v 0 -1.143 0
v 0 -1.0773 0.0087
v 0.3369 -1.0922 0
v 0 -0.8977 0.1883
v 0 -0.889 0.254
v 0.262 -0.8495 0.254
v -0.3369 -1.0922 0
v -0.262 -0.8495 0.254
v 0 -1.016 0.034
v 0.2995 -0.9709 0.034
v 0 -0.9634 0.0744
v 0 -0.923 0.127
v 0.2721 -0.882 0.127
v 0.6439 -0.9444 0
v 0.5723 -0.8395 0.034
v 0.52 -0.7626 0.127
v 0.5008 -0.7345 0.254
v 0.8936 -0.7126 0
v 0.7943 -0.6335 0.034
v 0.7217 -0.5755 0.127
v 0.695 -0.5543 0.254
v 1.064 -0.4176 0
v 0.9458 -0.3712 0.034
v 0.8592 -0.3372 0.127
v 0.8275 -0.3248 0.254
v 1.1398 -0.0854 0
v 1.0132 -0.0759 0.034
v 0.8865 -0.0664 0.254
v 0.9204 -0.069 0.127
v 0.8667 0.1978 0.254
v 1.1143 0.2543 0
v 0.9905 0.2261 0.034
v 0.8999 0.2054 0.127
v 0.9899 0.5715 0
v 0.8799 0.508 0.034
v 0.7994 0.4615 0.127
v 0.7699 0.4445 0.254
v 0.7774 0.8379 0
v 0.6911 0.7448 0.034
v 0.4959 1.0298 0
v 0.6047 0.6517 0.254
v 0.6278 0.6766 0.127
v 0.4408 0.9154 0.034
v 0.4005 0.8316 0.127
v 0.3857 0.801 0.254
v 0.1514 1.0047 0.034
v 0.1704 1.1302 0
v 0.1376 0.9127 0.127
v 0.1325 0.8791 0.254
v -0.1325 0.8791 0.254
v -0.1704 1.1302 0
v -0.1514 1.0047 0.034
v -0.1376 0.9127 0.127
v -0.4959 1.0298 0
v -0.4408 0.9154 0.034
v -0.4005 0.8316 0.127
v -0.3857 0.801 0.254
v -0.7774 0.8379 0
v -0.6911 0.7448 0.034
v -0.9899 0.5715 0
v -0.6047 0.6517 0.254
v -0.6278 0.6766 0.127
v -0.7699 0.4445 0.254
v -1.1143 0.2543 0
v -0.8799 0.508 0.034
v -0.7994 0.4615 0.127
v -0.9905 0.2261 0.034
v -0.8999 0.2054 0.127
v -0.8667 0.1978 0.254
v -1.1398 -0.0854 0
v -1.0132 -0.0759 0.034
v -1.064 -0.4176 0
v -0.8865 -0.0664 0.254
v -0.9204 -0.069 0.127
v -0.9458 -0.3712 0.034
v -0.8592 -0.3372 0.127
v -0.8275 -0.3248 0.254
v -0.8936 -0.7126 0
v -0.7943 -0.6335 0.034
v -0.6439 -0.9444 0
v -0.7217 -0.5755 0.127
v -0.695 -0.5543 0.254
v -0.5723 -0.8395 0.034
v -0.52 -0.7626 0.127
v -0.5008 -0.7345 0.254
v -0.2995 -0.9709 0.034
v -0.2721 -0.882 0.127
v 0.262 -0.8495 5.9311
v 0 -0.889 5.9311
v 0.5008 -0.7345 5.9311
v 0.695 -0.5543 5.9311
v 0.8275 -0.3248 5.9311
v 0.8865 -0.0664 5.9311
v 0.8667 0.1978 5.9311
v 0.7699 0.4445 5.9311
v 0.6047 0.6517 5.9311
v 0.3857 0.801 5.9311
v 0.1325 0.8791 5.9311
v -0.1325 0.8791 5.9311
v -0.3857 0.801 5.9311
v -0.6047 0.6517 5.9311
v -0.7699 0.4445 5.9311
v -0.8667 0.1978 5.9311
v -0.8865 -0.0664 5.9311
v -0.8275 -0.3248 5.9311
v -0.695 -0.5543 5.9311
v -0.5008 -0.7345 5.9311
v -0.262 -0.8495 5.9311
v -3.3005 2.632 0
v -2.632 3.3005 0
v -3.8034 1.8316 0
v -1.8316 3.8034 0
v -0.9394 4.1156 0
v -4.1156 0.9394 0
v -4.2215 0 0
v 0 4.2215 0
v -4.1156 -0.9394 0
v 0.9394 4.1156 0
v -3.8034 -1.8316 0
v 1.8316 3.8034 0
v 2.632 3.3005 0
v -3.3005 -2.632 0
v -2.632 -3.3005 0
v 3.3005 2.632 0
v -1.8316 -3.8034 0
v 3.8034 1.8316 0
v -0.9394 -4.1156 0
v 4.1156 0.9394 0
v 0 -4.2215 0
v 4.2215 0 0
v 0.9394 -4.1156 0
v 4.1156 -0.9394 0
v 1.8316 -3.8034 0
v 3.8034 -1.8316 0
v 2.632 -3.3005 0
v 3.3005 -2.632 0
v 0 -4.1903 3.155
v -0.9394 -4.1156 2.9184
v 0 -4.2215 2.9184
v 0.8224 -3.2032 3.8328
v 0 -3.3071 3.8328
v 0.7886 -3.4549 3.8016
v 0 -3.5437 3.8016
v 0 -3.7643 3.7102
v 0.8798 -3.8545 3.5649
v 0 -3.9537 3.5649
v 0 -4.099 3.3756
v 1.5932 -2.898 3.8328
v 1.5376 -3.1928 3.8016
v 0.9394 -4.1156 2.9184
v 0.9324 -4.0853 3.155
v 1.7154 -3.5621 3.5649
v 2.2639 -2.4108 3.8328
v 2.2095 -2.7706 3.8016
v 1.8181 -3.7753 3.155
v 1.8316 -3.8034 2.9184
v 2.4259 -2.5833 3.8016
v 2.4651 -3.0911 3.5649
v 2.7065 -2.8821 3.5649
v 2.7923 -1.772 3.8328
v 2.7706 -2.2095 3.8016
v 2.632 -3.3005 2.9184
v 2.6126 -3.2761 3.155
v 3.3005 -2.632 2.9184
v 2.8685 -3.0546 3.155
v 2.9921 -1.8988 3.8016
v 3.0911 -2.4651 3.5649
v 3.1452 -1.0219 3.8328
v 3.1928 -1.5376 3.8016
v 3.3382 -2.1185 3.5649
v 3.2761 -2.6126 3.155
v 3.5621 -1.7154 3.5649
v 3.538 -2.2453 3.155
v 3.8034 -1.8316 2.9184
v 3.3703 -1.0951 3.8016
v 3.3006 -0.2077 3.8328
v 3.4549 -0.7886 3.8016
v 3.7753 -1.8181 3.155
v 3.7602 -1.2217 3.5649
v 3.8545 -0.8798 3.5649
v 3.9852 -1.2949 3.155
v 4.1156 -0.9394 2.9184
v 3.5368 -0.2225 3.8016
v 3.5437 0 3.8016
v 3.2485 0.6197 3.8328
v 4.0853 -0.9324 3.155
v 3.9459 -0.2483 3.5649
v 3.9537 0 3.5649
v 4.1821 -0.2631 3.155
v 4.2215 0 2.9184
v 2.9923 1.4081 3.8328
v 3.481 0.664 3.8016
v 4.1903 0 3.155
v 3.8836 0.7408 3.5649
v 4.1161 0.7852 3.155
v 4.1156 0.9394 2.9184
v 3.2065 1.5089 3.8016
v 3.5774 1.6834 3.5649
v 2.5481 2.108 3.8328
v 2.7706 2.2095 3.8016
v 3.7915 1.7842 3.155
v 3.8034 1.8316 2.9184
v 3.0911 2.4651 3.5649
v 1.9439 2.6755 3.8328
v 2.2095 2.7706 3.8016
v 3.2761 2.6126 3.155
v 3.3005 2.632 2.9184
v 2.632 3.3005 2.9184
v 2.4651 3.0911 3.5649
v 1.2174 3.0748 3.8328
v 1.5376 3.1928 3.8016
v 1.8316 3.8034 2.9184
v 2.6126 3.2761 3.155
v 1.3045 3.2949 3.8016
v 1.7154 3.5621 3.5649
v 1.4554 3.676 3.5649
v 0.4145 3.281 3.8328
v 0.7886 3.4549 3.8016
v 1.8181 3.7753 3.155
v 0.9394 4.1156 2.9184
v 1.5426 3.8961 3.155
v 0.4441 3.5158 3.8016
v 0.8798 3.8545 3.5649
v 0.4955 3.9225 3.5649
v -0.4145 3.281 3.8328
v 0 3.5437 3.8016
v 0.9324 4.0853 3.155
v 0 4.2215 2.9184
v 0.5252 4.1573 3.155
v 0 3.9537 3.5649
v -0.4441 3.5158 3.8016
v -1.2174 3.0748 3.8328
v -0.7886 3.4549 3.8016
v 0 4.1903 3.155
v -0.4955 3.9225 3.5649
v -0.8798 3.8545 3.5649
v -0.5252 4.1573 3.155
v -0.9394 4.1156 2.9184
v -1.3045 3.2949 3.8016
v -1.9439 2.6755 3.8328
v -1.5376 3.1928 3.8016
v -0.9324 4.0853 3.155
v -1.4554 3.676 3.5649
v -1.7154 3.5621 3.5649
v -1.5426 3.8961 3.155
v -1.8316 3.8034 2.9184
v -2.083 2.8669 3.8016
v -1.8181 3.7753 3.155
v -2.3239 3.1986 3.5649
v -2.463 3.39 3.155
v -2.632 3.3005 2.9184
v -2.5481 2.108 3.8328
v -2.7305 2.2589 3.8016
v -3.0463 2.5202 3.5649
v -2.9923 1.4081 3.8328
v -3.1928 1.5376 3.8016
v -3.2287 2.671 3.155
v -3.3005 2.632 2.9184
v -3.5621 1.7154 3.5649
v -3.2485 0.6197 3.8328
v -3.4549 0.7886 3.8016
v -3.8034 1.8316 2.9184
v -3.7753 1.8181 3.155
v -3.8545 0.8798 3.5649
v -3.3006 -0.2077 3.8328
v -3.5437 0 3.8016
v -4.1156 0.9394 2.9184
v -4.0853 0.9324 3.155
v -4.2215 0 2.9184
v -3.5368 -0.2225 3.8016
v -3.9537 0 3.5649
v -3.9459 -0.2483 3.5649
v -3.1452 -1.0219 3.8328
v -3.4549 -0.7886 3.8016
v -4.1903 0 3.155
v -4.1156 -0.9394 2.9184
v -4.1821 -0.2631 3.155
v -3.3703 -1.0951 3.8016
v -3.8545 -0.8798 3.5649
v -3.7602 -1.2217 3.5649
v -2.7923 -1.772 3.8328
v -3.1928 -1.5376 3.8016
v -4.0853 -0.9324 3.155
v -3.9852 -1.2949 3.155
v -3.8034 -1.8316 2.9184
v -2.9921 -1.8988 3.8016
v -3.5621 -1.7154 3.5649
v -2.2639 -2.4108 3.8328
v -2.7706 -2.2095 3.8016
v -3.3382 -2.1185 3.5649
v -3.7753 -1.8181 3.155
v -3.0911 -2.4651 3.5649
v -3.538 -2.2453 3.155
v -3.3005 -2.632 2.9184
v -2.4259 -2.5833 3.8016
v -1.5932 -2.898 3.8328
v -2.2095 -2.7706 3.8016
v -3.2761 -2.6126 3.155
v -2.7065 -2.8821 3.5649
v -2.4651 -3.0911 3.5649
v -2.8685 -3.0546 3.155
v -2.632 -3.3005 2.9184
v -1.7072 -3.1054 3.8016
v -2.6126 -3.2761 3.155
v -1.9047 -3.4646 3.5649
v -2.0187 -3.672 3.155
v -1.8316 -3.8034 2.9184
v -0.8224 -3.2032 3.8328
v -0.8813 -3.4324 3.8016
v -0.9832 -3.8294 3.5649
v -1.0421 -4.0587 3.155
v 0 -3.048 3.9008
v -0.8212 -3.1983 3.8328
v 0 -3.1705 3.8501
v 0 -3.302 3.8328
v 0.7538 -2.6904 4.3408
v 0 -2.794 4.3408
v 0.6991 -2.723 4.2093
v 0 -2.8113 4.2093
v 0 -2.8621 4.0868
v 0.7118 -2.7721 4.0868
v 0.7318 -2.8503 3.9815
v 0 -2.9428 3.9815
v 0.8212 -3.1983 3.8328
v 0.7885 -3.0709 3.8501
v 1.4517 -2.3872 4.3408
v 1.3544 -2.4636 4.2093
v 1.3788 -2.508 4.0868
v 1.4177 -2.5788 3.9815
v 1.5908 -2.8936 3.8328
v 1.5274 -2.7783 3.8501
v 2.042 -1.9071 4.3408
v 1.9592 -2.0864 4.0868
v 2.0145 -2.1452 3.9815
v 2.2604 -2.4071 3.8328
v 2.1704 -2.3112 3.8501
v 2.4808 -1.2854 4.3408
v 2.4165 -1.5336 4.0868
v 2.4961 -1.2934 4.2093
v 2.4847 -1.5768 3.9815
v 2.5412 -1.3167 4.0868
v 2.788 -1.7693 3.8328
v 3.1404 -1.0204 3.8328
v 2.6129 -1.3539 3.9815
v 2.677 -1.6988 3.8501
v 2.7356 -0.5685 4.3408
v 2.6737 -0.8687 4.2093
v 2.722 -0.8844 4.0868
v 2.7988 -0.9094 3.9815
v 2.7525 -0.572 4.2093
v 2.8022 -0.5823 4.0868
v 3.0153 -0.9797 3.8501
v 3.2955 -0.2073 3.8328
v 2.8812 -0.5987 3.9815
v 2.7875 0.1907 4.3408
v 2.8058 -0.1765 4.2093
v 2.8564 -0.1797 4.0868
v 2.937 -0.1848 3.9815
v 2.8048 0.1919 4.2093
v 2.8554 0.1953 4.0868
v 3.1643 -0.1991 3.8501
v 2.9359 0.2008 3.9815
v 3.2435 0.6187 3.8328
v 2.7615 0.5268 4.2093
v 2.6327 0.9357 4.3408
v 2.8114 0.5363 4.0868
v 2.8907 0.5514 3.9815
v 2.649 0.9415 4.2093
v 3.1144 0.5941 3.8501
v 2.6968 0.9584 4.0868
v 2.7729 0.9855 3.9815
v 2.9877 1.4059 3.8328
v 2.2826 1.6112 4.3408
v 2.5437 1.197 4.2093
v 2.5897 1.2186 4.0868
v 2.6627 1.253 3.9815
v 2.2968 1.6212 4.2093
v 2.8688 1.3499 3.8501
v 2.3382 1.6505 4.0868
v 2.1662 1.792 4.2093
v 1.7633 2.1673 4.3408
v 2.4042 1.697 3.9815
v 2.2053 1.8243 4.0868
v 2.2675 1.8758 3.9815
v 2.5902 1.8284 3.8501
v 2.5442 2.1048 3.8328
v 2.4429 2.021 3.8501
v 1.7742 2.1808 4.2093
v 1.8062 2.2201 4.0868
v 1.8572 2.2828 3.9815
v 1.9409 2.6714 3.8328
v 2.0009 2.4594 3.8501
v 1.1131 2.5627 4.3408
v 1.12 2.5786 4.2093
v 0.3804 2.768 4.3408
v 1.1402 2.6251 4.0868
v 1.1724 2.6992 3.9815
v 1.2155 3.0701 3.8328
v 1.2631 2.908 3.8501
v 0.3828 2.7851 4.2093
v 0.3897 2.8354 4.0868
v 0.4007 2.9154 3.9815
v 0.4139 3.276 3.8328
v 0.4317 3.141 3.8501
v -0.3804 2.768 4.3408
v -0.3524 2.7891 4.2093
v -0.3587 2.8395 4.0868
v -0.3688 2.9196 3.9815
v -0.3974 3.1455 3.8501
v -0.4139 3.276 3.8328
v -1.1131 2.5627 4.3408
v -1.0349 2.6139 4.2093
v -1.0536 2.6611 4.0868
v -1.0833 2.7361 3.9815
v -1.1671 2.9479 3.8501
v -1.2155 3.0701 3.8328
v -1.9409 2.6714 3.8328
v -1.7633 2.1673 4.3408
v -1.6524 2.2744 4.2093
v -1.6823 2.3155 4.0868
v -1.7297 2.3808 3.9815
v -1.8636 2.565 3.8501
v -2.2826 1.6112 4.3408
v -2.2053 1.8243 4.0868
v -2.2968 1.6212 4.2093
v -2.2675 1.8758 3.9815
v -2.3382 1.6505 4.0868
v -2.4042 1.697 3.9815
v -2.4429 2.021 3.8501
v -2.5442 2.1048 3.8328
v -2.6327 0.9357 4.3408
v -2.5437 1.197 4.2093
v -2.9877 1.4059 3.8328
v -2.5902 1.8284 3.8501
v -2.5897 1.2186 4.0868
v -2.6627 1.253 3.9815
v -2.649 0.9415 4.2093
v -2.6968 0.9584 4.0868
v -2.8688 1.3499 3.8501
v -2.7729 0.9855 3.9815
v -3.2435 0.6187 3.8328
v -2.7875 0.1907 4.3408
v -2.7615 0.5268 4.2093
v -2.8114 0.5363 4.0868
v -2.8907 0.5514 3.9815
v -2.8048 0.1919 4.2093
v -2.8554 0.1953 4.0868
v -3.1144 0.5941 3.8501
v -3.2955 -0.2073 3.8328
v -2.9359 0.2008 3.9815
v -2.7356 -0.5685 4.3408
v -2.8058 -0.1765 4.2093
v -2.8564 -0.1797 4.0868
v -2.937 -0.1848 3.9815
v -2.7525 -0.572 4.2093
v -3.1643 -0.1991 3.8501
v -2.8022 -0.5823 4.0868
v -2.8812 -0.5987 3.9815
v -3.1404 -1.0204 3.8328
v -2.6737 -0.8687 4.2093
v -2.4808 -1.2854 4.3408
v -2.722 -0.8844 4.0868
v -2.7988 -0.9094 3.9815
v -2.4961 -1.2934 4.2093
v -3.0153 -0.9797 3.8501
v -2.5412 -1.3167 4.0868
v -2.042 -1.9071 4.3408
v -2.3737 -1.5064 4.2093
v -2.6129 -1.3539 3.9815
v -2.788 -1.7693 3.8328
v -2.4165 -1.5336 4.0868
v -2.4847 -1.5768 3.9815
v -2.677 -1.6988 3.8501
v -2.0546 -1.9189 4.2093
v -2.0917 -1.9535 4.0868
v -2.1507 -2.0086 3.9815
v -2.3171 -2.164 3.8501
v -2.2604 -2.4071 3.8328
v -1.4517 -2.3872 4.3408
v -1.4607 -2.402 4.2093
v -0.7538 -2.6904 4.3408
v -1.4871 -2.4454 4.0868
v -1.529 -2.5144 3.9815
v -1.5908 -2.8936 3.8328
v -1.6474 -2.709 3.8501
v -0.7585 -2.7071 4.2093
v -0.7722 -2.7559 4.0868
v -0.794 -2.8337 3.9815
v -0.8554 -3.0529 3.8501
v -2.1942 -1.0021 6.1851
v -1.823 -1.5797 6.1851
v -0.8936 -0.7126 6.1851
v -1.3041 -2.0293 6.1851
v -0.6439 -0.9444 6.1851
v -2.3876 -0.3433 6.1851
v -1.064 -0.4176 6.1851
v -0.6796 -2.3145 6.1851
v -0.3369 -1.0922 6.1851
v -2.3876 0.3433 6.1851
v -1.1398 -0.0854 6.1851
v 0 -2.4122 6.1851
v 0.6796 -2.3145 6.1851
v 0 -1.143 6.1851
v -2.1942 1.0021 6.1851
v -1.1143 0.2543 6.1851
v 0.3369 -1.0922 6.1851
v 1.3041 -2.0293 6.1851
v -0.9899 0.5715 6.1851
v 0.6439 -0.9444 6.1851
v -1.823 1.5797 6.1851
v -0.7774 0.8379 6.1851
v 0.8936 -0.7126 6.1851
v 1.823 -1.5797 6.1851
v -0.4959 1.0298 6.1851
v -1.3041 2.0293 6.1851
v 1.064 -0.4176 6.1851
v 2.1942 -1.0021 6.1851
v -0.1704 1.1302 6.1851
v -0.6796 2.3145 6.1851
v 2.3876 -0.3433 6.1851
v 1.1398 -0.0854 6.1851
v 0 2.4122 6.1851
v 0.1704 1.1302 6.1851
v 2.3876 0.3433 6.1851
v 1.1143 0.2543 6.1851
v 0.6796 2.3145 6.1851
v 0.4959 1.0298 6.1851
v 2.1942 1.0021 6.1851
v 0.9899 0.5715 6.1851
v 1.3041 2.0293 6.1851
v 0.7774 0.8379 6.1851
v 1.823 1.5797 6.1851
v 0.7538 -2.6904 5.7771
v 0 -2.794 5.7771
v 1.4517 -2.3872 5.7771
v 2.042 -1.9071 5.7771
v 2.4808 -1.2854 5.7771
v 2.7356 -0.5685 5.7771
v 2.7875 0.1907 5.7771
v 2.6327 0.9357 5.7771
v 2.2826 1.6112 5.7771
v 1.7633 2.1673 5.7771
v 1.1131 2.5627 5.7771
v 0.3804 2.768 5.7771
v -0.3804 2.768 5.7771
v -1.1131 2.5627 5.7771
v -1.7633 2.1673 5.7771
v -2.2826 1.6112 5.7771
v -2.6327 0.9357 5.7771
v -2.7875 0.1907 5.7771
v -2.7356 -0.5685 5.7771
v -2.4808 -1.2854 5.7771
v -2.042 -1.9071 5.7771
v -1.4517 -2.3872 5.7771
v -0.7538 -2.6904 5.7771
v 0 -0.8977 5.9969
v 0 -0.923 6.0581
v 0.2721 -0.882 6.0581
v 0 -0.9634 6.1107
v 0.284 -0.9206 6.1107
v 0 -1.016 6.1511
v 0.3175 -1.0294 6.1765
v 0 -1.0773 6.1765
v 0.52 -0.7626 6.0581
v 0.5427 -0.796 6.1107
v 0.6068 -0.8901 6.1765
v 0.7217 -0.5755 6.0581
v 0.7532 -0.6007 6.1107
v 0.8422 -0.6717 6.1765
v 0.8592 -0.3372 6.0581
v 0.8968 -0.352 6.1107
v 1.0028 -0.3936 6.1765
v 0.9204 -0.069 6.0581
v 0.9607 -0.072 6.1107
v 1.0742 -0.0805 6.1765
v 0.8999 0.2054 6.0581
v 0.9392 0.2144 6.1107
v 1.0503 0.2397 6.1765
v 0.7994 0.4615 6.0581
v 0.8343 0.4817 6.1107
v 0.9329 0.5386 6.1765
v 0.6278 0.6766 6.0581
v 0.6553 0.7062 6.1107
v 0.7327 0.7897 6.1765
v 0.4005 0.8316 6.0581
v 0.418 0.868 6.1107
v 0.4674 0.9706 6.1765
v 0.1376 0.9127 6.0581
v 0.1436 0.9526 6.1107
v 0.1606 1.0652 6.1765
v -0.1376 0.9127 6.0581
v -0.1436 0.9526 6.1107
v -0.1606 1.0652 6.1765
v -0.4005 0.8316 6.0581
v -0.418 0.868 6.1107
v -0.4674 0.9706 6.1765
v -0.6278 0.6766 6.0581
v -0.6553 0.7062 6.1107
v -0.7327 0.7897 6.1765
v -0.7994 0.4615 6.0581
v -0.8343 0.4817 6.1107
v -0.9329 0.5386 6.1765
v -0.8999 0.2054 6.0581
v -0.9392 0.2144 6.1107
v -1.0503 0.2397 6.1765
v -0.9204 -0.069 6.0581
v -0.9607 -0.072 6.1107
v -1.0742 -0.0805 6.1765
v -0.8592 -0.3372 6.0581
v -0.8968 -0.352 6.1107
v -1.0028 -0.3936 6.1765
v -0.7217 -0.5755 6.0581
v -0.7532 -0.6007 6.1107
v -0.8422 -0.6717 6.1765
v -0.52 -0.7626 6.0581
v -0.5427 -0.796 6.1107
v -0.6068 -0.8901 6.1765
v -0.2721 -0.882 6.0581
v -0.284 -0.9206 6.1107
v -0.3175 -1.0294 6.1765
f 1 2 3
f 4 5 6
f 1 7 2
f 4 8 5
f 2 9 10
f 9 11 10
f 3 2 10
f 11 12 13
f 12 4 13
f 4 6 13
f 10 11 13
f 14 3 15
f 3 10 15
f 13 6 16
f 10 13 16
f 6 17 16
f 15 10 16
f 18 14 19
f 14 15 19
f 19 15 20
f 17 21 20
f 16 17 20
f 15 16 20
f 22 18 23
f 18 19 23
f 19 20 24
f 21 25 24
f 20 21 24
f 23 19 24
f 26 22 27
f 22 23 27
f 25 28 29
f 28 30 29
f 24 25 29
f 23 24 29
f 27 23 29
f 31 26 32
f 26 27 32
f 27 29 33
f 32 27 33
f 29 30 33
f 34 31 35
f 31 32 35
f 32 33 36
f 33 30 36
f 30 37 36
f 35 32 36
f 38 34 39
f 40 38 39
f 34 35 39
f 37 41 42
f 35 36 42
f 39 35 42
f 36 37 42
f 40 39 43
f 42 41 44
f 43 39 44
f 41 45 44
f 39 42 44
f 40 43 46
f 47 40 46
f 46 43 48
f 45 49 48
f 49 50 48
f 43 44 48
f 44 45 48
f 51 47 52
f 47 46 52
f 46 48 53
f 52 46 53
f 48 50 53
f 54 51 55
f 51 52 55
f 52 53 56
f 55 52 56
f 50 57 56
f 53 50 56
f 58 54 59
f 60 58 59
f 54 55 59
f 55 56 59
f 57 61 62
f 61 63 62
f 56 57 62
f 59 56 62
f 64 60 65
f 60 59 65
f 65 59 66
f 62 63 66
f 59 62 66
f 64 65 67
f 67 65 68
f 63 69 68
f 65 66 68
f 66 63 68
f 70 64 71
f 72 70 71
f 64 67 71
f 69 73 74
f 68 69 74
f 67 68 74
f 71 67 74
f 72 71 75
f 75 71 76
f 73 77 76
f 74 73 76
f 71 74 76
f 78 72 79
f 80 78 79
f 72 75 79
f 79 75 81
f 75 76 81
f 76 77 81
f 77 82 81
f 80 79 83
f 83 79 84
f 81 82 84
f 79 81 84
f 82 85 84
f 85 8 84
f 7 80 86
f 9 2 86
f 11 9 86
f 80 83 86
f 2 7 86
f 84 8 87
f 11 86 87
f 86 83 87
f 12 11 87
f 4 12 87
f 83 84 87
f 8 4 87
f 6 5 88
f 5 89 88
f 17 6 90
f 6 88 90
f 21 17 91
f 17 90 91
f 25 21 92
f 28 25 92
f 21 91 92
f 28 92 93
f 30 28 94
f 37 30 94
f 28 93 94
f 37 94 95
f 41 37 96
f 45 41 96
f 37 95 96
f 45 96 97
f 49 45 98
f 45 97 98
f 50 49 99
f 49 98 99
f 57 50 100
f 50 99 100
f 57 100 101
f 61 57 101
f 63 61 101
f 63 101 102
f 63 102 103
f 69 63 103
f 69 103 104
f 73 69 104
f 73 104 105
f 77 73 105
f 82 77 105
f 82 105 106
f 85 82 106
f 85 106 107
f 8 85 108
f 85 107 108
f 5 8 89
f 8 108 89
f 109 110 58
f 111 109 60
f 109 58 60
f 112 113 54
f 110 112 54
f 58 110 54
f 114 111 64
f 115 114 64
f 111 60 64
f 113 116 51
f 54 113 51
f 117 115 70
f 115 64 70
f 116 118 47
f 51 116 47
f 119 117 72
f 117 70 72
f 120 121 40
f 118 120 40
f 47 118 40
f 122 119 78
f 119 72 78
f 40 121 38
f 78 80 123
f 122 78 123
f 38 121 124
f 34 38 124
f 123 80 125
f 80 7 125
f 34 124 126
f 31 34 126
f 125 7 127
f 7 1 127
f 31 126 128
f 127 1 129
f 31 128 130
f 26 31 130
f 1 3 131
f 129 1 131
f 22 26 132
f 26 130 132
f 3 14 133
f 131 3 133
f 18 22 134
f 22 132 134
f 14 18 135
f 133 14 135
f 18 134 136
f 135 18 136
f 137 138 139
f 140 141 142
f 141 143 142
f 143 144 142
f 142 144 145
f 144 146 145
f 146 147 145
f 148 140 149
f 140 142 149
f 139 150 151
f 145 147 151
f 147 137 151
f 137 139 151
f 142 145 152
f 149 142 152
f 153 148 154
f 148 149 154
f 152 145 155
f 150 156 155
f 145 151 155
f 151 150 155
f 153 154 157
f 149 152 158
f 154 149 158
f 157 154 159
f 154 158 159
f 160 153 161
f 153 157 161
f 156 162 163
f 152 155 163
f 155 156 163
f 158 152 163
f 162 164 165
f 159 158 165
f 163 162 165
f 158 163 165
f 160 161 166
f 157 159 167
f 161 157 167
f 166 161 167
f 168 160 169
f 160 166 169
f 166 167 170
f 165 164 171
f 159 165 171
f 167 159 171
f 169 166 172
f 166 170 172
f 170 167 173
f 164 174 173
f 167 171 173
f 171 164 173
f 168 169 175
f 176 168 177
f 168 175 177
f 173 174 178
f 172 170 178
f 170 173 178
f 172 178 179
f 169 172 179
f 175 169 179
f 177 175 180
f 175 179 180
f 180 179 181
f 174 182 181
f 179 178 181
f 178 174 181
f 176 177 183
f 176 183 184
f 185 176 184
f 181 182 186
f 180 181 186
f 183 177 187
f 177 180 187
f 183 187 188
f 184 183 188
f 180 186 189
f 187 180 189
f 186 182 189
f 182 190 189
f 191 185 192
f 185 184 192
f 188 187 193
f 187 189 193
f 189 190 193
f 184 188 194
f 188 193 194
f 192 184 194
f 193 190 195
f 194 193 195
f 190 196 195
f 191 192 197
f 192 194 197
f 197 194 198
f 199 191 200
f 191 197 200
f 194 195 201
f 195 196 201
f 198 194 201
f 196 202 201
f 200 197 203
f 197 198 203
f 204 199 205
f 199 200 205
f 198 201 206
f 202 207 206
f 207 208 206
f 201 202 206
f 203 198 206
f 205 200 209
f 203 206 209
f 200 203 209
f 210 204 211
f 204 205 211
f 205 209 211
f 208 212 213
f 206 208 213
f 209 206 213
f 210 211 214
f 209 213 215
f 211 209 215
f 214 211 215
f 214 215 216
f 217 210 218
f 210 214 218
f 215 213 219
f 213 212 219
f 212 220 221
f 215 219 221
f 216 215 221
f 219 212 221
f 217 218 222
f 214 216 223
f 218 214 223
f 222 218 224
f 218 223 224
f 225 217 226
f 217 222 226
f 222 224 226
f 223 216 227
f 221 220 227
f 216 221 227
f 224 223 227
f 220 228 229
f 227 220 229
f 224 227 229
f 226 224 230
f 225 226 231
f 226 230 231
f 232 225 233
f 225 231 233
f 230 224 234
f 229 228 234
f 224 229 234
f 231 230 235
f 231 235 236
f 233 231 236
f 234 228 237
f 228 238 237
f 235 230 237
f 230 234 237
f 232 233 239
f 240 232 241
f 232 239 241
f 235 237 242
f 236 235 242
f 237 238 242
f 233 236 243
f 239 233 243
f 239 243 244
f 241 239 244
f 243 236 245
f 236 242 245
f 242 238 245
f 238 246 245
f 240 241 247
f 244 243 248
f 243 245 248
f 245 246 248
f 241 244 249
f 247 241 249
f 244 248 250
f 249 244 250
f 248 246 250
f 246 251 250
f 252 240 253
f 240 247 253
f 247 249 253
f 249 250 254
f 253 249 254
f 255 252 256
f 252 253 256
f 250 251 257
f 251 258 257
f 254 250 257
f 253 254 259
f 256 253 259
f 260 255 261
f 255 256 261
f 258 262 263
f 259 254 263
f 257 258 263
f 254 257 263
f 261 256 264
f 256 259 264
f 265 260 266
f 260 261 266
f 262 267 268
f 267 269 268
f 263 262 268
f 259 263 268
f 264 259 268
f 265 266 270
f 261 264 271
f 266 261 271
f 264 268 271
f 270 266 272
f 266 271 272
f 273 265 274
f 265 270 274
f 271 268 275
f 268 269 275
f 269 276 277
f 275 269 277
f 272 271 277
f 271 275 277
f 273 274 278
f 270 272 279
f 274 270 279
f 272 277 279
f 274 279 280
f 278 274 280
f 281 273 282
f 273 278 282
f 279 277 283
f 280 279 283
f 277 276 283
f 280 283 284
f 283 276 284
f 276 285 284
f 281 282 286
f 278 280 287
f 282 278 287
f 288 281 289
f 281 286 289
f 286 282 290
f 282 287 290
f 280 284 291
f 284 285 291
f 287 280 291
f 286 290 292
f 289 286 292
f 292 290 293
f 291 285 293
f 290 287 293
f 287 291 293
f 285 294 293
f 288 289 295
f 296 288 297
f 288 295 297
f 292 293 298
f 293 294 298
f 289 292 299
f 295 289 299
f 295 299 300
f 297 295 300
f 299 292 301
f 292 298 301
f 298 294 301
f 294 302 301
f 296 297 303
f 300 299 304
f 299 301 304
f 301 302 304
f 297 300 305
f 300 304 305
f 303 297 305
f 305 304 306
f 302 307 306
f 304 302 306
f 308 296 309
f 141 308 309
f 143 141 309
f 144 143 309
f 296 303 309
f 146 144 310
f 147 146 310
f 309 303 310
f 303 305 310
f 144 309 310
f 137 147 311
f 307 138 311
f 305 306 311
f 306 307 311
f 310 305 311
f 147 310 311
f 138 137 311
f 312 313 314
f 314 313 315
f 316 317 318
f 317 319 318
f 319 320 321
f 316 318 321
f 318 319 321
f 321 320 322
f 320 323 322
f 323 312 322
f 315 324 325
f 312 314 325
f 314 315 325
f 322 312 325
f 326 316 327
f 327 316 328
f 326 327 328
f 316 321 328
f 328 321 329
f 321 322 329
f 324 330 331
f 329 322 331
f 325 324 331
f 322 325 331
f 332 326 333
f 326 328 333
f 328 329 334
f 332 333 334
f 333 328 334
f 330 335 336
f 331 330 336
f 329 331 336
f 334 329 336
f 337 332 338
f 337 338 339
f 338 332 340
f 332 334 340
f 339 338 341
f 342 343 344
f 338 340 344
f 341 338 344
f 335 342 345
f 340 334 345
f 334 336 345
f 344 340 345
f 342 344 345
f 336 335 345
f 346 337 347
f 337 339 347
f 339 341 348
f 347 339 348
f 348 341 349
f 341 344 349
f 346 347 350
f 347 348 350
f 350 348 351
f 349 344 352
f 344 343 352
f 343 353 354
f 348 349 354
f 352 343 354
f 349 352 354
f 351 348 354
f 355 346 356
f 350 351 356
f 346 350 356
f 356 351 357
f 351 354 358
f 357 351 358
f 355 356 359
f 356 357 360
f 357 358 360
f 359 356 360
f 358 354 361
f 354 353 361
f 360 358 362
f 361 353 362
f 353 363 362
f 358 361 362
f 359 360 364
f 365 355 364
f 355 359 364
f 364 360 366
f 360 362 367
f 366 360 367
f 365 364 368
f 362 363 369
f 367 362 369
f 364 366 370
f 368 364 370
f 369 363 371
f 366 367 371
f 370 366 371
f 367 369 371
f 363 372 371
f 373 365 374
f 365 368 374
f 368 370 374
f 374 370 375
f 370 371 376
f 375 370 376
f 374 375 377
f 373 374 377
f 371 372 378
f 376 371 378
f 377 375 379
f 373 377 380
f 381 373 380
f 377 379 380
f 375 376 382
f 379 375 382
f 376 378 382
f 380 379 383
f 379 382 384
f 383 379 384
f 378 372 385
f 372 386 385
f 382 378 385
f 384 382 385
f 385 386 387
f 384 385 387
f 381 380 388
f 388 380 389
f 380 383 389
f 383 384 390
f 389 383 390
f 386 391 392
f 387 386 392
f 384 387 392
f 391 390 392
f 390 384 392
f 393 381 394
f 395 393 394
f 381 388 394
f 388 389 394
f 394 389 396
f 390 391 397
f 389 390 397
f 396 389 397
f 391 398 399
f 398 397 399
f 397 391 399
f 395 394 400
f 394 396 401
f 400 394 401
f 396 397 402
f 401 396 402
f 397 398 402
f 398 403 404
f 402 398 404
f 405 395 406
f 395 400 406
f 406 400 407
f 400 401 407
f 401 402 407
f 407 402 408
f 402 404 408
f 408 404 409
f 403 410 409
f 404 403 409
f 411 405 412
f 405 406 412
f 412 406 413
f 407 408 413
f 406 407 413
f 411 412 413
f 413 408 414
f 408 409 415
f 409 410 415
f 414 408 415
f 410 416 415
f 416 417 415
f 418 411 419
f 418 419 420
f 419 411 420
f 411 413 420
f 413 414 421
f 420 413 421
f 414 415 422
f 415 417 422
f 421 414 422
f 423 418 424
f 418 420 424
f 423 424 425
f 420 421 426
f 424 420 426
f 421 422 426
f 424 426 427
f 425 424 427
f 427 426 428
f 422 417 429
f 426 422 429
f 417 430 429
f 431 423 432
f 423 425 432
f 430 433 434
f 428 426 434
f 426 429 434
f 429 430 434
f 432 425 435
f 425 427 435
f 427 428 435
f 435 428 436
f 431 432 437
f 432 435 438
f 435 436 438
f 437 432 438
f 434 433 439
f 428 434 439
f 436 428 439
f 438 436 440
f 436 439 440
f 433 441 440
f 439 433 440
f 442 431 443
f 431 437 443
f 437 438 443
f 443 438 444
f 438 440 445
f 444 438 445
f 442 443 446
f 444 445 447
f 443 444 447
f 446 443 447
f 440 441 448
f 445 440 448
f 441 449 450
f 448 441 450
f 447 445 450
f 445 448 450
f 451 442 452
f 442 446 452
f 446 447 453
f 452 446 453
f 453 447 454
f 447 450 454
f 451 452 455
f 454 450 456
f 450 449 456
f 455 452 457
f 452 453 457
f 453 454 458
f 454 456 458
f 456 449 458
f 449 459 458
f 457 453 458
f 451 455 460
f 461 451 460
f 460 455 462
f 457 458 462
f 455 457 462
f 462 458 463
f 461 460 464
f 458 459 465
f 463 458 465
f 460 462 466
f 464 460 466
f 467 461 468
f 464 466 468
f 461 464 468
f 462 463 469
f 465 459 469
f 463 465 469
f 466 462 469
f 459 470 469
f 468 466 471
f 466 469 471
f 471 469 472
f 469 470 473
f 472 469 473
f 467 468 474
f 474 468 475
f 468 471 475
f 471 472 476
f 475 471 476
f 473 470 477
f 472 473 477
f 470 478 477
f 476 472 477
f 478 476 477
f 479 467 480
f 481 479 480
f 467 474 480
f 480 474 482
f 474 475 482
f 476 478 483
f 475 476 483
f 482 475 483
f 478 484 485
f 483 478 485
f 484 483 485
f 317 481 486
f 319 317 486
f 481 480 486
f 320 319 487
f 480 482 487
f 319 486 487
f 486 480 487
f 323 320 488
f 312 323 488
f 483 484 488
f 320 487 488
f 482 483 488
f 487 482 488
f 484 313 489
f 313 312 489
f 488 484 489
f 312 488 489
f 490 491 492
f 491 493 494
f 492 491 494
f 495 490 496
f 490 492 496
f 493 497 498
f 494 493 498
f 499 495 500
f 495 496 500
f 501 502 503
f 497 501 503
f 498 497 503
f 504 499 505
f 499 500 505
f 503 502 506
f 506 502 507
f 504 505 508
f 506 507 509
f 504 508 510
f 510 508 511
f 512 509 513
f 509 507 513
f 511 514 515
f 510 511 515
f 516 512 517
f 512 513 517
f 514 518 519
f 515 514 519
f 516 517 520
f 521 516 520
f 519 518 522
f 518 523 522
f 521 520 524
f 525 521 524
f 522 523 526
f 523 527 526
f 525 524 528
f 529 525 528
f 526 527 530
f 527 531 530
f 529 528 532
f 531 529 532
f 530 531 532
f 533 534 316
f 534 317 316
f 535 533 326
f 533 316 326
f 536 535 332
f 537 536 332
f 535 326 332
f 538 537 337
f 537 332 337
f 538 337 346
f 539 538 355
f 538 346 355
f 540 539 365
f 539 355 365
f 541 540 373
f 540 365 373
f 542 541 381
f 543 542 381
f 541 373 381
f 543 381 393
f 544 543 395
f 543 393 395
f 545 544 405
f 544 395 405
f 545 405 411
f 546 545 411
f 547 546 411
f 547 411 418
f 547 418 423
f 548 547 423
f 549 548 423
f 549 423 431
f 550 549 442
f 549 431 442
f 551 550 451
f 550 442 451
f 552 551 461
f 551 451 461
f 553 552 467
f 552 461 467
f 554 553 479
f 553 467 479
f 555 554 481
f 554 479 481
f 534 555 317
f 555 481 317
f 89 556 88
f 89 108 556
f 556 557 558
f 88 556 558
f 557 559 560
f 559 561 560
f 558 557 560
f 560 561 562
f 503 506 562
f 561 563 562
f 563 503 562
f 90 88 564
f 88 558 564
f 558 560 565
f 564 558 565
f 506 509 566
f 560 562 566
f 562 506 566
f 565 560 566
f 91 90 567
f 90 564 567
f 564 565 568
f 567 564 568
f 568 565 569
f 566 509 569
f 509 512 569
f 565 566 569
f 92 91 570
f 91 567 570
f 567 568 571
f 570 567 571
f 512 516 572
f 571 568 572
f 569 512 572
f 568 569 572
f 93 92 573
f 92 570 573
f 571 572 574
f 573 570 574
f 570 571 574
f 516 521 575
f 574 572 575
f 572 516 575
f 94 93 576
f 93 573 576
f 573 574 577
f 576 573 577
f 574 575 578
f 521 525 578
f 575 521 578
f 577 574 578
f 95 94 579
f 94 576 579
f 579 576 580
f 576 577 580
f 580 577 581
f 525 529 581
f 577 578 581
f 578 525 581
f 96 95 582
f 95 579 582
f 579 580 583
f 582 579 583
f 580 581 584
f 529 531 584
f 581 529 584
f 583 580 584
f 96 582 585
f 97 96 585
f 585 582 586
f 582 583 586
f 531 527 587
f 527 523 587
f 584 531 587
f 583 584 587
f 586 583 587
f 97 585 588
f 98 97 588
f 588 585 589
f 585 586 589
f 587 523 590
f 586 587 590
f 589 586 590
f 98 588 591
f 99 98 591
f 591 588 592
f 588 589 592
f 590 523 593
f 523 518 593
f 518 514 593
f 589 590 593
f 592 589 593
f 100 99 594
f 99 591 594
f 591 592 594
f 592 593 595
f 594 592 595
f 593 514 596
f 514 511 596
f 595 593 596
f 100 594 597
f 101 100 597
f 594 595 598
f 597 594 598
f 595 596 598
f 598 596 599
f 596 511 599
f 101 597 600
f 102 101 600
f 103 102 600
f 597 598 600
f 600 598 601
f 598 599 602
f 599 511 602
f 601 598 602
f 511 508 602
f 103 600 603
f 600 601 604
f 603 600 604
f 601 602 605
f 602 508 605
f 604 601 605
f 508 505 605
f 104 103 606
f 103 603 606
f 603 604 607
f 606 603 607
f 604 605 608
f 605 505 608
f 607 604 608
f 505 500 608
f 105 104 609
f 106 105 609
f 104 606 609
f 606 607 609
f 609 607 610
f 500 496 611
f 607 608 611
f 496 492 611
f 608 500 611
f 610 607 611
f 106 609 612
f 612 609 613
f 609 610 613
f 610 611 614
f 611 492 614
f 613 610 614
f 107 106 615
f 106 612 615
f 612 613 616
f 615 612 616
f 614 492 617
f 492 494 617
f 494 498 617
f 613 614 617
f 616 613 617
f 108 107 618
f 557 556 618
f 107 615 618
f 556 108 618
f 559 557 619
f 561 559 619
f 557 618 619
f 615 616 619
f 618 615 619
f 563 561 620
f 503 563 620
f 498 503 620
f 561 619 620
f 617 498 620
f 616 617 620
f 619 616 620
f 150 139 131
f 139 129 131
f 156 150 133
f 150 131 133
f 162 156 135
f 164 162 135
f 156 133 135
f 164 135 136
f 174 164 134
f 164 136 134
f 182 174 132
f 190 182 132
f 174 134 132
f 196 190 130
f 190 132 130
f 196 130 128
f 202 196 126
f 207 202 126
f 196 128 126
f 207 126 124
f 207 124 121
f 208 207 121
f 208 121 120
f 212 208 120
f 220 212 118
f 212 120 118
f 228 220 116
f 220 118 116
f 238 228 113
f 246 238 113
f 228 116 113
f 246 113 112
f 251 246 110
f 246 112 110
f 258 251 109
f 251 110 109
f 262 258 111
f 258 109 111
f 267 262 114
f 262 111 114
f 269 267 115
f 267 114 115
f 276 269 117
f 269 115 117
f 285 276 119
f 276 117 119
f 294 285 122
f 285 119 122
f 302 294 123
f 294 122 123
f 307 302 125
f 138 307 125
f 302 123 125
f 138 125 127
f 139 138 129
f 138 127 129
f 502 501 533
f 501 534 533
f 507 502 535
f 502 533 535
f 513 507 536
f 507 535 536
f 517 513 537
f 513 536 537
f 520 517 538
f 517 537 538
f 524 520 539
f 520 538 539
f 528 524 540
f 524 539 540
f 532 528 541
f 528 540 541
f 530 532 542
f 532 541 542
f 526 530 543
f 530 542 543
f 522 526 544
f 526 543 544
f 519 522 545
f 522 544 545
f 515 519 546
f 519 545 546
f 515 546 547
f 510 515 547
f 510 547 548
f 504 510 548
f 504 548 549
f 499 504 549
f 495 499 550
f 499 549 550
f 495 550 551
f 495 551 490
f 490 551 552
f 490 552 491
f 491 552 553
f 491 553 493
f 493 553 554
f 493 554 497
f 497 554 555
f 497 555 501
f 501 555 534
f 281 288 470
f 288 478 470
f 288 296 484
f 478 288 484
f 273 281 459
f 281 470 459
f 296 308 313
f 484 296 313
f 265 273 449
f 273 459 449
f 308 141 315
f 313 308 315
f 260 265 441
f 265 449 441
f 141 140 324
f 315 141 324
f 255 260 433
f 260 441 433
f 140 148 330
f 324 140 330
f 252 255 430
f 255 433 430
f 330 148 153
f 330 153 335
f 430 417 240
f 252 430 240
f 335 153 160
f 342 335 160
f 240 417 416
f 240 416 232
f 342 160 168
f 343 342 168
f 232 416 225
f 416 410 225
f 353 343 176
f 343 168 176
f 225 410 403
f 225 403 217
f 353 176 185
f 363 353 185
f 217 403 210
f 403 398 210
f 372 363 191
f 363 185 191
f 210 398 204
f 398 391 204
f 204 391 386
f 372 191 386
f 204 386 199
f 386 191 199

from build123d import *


with BuildPart() as f1:
    # F0 (on Right) → F1 (revolve)
    with BuildSketch(Plane.YZ):
        with BuildLine():
            ThreePointArc((-1.143, 0), (-0.963395, 0.074395), (-0.889, 0.254))
            Line((-0.889, 0.254), (-0.889, 5.931143))
            ThreePointArc((-0.889, 5.931143), (-0.963395, 6.110748), (-1.143, 6.185143))
            Line((-1.143, 6.185143), (-2.412197, 6.185143))
            Line((-2.412197, 6.185143), (-2.794, 5.777119))
            Line((-2.794, 5.777119), (-2.794, 4.340756))
            ThreePointArc((-2.794, 4.340756), (-2.94279, 3.981545), (-3.302, 3.832756))
            Line((-3.302, 3.832756), (-3.30708, 3.832756))
            ThreePointArc((-3.30708, 3.832756), (-3.953658, 3.564934), (-4.22148, 2.918356))
            Line((-4.22148, 2.918356), (-4.22148, 0))
            Line((-4.22148, 0), (-1.143, 0))
        make_face()
    revolve(axis=Axis((0, 0, 3.175), (0, 0, 1)))


solid = f1.part
